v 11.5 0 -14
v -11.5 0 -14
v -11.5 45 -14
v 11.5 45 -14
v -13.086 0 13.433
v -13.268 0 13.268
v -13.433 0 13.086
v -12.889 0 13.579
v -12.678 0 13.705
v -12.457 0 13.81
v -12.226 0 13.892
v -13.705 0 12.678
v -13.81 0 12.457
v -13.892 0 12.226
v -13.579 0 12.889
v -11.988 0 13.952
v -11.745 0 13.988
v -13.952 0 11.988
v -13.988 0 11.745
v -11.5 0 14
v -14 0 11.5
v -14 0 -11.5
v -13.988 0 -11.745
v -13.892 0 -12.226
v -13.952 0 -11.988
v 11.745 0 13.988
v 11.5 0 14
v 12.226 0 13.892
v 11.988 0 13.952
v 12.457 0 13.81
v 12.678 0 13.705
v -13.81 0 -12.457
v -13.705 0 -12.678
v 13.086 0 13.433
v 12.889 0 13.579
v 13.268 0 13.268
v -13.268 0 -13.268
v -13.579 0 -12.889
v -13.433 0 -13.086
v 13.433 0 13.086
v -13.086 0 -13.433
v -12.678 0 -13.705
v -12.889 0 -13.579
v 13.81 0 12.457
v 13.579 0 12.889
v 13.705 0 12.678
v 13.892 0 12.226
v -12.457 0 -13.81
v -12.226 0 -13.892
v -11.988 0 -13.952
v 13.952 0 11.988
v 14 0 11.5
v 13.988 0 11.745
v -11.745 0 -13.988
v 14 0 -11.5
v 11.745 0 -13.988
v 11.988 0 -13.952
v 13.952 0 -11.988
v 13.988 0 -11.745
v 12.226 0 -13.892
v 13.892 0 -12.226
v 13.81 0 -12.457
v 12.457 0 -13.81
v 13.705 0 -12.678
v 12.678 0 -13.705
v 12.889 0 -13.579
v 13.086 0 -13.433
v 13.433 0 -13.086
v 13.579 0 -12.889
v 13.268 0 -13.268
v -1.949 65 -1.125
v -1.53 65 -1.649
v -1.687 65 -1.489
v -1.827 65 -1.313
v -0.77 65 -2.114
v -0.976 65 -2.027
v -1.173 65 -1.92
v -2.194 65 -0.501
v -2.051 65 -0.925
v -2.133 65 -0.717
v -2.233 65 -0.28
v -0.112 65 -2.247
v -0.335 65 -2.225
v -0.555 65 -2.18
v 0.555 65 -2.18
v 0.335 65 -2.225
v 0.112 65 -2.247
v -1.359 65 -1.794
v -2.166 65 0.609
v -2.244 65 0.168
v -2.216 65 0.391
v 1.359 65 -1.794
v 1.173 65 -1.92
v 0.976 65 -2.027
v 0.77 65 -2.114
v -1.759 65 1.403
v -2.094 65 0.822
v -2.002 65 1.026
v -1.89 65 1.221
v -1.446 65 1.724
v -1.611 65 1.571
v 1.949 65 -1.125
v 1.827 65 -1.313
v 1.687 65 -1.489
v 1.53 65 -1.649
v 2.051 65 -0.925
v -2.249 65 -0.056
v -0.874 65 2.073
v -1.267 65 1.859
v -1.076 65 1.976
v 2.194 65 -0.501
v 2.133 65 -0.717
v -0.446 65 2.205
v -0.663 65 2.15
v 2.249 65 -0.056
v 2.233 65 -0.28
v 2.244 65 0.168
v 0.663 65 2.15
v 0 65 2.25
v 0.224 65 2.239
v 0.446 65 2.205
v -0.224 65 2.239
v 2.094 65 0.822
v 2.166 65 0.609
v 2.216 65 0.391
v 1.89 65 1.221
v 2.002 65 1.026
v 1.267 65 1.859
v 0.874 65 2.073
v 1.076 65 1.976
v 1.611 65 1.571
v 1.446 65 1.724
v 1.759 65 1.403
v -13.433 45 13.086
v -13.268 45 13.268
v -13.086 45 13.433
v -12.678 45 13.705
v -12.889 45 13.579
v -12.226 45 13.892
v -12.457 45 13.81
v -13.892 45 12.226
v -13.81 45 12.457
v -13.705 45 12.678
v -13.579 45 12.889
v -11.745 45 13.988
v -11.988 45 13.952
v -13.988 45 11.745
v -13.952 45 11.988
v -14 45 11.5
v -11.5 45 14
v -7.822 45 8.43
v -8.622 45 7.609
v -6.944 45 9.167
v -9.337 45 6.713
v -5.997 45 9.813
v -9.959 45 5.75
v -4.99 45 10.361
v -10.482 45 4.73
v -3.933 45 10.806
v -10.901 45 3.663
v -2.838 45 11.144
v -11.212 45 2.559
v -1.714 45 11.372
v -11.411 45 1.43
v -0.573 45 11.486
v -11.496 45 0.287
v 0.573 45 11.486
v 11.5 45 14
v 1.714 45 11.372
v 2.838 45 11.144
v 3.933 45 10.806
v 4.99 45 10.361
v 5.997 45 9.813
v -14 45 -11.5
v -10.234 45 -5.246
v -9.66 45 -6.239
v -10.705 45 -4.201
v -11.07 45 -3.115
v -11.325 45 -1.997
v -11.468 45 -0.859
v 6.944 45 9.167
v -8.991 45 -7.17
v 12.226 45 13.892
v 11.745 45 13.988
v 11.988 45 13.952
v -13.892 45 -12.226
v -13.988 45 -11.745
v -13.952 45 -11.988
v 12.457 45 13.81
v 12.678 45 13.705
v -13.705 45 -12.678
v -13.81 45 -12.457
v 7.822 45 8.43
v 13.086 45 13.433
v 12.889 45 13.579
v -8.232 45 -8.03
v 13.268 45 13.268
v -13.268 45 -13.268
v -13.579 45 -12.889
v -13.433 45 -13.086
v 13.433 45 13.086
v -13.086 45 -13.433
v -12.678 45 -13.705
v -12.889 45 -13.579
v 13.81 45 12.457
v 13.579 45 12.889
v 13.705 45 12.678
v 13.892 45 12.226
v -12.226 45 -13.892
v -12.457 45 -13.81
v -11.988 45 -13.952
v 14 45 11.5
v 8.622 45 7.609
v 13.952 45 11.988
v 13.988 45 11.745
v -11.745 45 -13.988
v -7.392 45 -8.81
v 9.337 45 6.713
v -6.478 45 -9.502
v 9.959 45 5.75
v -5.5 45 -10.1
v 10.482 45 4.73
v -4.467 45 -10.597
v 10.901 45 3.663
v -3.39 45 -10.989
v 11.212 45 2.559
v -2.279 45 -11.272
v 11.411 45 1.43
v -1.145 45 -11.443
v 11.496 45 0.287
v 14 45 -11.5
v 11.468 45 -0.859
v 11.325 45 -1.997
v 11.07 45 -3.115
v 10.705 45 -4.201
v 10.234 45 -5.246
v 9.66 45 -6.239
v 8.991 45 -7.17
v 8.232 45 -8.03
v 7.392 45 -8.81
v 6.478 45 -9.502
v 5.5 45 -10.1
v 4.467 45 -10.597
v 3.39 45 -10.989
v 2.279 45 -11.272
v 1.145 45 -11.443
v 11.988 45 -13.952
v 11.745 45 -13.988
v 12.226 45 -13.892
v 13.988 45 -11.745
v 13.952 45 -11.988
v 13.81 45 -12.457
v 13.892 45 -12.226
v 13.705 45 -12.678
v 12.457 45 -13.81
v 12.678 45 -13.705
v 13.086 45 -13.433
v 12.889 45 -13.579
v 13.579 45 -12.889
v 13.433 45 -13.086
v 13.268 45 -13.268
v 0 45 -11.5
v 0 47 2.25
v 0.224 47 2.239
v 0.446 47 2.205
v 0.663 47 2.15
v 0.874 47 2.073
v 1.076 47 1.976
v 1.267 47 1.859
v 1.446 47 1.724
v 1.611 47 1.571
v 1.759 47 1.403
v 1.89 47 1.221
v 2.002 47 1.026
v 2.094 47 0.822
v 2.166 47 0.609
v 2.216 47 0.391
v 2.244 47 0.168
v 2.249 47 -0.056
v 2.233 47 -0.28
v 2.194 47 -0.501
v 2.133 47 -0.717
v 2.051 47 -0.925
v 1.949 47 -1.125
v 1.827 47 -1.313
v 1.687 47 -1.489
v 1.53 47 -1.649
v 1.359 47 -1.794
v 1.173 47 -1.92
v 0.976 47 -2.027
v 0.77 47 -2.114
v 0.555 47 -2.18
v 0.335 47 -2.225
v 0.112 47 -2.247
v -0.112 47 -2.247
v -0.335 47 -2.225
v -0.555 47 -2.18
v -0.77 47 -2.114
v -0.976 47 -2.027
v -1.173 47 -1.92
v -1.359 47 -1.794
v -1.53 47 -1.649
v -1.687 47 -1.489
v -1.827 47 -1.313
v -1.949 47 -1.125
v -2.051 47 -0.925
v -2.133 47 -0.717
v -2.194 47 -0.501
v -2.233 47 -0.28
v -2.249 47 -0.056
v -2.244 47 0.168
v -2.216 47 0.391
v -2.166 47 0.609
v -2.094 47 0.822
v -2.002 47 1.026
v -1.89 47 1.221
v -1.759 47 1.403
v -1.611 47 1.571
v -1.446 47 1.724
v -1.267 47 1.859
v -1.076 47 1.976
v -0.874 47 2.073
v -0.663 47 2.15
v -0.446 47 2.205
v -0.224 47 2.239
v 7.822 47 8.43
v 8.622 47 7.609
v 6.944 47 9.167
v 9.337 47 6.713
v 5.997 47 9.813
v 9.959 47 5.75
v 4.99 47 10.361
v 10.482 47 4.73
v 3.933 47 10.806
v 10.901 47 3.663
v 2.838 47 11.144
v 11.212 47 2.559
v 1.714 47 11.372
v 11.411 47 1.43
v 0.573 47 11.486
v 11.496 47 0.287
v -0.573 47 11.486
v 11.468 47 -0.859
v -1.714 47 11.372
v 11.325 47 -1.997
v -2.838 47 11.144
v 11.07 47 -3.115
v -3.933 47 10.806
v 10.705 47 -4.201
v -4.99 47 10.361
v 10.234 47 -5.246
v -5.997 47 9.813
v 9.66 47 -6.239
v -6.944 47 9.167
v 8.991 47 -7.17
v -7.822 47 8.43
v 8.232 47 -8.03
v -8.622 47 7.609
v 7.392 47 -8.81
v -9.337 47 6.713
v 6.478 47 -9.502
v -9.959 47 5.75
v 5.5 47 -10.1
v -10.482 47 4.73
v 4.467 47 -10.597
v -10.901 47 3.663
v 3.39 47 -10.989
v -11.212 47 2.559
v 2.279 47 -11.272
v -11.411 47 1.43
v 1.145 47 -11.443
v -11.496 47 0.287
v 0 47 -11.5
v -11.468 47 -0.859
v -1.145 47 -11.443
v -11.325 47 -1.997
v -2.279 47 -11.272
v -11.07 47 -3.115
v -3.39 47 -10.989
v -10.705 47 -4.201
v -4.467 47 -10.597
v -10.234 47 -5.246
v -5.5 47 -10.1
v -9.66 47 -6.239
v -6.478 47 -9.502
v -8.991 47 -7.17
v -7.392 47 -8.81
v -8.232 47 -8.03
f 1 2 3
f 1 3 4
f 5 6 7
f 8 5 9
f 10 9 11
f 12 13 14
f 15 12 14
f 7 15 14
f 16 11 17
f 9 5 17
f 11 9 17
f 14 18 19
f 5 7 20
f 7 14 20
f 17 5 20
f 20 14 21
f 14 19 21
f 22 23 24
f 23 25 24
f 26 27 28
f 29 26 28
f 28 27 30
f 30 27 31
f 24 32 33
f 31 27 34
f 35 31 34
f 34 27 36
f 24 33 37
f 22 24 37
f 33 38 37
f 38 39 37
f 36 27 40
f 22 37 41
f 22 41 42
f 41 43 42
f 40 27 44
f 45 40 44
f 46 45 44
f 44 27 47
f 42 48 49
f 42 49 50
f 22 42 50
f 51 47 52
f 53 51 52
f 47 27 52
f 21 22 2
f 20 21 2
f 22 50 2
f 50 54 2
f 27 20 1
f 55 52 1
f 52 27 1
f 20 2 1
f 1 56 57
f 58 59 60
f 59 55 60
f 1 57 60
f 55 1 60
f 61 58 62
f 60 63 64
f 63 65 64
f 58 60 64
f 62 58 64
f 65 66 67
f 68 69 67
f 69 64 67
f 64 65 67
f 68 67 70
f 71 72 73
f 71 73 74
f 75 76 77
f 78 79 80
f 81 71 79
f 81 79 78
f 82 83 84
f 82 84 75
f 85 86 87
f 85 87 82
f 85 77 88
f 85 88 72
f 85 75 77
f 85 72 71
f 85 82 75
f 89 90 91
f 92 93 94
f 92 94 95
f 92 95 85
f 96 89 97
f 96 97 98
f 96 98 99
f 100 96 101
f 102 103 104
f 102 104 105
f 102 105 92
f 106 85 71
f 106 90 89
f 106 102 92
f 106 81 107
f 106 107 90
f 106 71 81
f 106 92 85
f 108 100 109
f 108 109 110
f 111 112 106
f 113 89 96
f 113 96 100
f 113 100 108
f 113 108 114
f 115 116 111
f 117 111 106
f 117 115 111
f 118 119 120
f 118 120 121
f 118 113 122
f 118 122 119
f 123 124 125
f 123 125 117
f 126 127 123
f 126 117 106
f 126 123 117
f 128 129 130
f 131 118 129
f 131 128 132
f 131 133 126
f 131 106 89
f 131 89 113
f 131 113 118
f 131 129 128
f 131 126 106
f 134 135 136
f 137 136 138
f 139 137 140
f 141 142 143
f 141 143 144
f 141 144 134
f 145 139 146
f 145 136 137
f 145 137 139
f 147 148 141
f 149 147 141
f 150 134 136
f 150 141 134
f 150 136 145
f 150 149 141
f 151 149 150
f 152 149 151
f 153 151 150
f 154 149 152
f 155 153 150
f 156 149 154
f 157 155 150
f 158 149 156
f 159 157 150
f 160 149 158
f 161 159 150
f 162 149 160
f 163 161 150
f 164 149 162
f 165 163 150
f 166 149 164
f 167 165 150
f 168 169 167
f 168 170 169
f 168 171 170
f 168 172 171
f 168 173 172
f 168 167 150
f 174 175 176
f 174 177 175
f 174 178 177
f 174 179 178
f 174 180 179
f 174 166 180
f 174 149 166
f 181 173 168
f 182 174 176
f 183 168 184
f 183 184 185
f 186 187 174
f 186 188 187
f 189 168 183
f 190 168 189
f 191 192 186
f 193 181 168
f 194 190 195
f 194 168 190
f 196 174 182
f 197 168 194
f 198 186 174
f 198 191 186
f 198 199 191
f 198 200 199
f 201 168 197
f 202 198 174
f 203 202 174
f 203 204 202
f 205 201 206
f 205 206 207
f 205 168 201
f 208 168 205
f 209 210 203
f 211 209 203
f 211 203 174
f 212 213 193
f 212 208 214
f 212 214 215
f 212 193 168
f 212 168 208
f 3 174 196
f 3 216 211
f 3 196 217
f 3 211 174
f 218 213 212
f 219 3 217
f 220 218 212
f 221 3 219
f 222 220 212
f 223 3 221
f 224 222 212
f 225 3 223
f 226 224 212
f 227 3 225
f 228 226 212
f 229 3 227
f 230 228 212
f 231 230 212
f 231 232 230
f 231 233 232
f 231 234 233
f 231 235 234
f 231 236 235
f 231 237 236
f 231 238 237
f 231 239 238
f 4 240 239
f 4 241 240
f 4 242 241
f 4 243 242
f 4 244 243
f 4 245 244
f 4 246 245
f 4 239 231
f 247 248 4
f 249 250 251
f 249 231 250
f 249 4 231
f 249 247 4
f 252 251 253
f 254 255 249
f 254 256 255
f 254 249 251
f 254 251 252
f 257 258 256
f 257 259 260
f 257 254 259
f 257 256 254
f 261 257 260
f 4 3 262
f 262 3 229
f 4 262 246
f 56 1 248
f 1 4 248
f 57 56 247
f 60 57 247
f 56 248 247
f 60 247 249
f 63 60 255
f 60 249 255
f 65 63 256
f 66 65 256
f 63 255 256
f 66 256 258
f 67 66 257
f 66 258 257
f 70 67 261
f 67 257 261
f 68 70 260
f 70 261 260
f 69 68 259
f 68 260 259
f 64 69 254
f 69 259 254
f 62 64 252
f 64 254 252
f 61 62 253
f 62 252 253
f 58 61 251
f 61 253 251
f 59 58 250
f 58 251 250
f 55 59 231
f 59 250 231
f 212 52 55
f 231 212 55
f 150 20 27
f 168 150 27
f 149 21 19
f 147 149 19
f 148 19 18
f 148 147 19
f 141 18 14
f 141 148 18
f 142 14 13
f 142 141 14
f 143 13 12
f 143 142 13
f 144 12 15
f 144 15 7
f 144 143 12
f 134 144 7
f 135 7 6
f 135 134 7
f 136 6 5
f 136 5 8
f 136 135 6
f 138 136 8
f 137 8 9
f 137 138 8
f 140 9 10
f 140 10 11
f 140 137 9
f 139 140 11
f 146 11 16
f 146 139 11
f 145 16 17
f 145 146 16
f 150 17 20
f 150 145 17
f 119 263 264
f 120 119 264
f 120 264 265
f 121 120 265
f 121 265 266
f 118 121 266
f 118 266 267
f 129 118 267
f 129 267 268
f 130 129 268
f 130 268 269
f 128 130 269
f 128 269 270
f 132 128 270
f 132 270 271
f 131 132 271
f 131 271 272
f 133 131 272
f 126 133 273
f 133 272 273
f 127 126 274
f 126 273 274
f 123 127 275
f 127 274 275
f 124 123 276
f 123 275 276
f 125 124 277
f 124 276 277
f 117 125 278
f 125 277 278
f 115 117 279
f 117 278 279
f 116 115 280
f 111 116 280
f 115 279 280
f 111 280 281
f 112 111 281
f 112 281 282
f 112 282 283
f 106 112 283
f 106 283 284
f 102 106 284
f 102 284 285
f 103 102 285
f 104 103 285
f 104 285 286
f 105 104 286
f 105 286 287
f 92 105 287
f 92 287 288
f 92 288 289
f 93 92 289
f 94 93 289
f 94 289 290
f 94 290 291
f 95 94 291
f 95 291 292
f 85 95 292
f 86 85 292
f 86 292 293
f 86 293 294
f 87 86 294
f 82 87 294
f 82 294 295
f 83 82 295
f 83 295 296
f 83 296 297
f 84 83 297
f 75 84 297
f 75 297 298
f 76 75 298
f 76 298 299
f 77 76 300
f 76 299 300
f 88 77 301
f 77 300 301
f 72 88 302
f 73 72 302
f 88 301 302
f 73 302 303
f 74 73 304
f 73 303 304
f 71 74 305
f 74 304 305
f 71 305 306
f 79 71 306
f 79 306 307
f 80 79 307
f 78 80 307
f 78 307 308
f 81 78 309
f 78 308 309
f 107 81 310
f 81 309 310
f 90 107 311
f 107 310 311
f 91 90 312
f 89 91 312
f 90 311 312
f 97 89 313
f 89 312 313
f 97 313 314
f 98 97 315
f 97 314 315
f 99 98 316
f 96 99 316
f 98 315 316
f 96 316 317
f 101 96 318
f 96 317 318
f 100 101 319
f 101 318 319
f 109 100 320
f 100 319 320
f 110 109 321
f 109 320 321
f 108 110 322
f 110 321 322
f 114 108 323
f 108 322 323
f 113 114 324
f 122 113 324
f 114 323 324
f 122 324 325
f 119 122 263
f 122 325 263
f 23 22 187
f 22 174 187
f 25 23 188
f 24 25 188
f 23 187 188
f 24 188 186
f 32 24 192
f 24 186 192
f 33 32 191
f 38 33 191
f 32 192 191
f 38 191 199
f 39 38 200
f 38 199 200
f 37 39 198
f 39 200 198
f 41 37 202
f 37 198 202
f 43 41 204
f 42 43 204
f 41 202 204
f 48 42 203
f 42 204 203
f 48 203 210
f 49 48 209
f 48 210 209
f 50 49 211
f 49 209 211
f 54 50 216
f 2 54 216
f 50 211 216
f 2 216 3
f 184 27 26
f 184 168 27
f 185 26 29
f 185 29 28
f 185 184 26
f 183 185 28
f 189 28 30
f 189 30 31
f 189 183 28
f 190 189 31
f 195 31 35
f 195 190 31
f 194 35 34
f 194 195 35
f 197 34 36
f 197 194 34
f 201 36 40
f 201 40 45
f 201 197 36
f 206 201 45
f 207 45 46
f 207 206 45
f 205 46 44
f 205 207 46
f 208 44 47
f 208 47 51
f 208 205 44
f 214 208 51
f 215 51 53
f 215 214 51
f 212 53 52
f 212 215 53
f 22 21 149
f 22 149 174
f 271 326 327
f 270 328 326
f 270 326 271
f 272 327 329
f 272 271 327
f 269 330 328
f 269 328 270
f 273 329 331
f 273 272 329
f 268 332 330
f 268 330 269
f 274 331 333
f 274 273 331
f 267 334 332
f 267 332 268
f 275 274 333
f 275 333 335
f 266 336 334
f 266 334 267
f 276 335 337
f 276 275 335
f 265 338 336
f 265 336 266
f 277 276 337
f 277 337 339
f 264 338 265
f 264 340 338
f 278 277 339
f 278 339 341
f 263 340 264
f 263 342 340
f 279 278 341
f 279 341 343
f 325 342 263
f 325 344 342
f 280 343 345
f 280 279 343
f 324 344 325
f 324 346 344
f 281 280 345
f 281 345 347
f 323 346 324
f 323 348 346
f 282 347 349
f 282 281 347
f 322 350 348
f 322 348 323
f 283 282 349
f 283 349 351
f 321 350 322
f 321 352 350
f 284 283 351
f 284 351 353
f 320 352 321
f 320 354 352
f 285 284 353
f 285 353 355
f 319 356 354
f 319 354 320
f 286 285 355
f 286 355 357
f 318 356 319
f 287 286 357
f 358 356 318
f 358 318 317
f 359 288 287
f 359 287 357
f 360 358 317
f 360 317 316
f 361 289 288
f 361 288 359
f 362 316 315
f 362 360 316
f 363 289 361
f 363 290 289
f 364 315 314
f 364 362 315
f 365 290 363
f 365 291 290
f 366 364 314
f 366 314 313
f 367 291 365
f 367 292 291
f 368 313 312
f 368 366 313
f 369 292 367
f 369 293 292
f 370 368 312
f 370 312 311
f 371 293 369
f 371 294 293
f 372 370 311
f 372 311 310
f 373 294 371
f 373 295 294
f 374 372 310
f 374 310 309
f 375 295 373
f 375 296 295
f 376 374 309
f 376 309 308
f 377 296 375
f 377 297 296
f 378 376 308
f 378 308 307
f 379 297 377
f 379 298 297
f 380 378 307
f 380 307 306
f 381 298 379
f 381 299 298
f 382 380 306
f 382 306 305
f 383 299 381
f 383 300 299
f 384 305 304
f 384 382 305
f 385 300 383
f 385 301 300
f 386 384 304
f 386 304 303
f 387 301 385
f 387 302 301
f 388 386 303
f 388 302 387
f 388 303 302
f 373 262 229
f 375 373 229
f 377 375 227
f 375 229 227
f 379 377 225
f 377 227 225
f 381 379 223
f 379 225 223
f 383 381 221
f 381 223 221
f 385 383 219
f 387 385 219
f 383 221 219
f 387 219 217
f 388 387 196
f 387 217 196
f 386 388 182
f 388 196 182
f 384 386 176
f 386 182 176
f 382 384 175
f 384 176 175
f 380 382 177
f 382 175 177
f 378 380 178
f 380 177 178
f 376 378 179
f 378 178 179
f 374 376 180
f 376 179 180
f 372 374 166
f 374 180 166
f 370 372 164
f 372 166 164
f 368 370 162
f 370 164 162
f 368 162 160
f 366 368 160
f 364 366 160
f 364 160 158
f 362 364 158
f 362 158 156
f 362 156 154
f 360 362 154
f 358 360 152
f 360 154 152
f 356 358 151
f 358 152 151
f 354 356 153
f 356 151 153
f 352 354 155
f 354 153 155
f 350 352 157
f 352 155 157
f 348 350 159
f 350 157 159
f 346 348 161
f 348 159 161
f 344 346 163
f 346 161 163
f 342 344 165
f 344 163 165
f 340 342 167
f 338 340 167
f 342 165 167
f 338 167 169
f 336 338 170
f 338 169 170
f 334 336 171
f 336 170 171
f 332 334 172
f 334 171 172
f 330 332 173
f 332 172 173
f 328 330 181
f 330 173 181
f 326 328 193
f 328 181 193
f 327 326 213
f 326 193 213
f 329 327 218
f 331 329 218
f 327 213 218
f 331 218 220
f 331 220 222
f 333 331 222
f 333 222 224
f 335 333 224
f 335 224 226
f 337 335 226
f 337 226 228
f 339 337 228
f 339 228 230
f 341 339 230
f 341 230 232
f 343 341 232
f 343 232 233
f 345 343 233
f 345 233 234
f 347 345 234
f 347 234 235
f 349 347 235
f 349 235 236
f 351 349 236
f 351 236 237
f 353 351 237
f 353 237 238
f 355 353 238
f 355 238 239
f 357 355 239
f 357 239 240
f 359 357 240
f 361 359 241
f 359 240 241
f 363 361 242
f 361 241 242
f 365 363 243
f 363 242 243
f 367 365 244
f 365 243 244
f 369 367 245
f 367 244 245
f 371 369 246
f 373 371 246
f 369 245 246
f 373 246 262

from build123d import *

# Parameters (mm, degrees)
SKETCH1_W           = 28
SKETCH1_H           = 28
BOSS_EXTRUDE1_DEPTH = 45
SKETCH2_R           = 11.5
BOSS_EXTRUDE2_DEPTH = 2
SKETCH3_R           = 2.25
BOSS_EXTRUDE3_DEPTH = 20
FILLET1_R           = 2.5


with BuildPart() as part:
    # Sketch1 → Boss-Extrude1 (new body)
    with BuildSketch(Plane(origin=(0, 0, 0), x_dir=(1, 0, 0), z_dir=(0, 1, 0))):
        Rectangle(SKETCH1_W, SKETCH1_H)
    extrude(amount=BOSS_EXTRUDE1_DEPTH)

    # Sketch2 → Boss-Extrude2 (add)
    with BuildSketch(Plane(origin=(0, 45, 0), x_dir=(1, 0, 0), z_dir=(0, 1, 0))):
        with Locations(Location((0, 0, 0), (0, 0, 90))):
            Circle(SKETCH2_R)
    extrude(amount=BOSS_EXTRUDE2_DEPTH)

    # Sketch3 → Boss-Extrude3 (add)
    with BuildSketch(Plane(origin=(0, 45, 0), x_dir=(1, 0, 0), z_dir=(0, 1, 0))):
        with Locations(Location((0, 0, 0), (0, 0, 270))):
            Circle(SKETCH3_R)
    extrude(amount=BOSS_EXTRUDE3_DEPTH)

    # Fillet1
    fillet1_edges = [part.edges().sort_by_distance(p)[0] for p in [
        (-14, 22.5, -14),
        (14, 22.5, -14),
        (14, 22.5, 14),
        (-14, 22.5, 14),
    ]]
    fillet(fillet1_edges, radius=FILLET1_R)


solid = part.part
